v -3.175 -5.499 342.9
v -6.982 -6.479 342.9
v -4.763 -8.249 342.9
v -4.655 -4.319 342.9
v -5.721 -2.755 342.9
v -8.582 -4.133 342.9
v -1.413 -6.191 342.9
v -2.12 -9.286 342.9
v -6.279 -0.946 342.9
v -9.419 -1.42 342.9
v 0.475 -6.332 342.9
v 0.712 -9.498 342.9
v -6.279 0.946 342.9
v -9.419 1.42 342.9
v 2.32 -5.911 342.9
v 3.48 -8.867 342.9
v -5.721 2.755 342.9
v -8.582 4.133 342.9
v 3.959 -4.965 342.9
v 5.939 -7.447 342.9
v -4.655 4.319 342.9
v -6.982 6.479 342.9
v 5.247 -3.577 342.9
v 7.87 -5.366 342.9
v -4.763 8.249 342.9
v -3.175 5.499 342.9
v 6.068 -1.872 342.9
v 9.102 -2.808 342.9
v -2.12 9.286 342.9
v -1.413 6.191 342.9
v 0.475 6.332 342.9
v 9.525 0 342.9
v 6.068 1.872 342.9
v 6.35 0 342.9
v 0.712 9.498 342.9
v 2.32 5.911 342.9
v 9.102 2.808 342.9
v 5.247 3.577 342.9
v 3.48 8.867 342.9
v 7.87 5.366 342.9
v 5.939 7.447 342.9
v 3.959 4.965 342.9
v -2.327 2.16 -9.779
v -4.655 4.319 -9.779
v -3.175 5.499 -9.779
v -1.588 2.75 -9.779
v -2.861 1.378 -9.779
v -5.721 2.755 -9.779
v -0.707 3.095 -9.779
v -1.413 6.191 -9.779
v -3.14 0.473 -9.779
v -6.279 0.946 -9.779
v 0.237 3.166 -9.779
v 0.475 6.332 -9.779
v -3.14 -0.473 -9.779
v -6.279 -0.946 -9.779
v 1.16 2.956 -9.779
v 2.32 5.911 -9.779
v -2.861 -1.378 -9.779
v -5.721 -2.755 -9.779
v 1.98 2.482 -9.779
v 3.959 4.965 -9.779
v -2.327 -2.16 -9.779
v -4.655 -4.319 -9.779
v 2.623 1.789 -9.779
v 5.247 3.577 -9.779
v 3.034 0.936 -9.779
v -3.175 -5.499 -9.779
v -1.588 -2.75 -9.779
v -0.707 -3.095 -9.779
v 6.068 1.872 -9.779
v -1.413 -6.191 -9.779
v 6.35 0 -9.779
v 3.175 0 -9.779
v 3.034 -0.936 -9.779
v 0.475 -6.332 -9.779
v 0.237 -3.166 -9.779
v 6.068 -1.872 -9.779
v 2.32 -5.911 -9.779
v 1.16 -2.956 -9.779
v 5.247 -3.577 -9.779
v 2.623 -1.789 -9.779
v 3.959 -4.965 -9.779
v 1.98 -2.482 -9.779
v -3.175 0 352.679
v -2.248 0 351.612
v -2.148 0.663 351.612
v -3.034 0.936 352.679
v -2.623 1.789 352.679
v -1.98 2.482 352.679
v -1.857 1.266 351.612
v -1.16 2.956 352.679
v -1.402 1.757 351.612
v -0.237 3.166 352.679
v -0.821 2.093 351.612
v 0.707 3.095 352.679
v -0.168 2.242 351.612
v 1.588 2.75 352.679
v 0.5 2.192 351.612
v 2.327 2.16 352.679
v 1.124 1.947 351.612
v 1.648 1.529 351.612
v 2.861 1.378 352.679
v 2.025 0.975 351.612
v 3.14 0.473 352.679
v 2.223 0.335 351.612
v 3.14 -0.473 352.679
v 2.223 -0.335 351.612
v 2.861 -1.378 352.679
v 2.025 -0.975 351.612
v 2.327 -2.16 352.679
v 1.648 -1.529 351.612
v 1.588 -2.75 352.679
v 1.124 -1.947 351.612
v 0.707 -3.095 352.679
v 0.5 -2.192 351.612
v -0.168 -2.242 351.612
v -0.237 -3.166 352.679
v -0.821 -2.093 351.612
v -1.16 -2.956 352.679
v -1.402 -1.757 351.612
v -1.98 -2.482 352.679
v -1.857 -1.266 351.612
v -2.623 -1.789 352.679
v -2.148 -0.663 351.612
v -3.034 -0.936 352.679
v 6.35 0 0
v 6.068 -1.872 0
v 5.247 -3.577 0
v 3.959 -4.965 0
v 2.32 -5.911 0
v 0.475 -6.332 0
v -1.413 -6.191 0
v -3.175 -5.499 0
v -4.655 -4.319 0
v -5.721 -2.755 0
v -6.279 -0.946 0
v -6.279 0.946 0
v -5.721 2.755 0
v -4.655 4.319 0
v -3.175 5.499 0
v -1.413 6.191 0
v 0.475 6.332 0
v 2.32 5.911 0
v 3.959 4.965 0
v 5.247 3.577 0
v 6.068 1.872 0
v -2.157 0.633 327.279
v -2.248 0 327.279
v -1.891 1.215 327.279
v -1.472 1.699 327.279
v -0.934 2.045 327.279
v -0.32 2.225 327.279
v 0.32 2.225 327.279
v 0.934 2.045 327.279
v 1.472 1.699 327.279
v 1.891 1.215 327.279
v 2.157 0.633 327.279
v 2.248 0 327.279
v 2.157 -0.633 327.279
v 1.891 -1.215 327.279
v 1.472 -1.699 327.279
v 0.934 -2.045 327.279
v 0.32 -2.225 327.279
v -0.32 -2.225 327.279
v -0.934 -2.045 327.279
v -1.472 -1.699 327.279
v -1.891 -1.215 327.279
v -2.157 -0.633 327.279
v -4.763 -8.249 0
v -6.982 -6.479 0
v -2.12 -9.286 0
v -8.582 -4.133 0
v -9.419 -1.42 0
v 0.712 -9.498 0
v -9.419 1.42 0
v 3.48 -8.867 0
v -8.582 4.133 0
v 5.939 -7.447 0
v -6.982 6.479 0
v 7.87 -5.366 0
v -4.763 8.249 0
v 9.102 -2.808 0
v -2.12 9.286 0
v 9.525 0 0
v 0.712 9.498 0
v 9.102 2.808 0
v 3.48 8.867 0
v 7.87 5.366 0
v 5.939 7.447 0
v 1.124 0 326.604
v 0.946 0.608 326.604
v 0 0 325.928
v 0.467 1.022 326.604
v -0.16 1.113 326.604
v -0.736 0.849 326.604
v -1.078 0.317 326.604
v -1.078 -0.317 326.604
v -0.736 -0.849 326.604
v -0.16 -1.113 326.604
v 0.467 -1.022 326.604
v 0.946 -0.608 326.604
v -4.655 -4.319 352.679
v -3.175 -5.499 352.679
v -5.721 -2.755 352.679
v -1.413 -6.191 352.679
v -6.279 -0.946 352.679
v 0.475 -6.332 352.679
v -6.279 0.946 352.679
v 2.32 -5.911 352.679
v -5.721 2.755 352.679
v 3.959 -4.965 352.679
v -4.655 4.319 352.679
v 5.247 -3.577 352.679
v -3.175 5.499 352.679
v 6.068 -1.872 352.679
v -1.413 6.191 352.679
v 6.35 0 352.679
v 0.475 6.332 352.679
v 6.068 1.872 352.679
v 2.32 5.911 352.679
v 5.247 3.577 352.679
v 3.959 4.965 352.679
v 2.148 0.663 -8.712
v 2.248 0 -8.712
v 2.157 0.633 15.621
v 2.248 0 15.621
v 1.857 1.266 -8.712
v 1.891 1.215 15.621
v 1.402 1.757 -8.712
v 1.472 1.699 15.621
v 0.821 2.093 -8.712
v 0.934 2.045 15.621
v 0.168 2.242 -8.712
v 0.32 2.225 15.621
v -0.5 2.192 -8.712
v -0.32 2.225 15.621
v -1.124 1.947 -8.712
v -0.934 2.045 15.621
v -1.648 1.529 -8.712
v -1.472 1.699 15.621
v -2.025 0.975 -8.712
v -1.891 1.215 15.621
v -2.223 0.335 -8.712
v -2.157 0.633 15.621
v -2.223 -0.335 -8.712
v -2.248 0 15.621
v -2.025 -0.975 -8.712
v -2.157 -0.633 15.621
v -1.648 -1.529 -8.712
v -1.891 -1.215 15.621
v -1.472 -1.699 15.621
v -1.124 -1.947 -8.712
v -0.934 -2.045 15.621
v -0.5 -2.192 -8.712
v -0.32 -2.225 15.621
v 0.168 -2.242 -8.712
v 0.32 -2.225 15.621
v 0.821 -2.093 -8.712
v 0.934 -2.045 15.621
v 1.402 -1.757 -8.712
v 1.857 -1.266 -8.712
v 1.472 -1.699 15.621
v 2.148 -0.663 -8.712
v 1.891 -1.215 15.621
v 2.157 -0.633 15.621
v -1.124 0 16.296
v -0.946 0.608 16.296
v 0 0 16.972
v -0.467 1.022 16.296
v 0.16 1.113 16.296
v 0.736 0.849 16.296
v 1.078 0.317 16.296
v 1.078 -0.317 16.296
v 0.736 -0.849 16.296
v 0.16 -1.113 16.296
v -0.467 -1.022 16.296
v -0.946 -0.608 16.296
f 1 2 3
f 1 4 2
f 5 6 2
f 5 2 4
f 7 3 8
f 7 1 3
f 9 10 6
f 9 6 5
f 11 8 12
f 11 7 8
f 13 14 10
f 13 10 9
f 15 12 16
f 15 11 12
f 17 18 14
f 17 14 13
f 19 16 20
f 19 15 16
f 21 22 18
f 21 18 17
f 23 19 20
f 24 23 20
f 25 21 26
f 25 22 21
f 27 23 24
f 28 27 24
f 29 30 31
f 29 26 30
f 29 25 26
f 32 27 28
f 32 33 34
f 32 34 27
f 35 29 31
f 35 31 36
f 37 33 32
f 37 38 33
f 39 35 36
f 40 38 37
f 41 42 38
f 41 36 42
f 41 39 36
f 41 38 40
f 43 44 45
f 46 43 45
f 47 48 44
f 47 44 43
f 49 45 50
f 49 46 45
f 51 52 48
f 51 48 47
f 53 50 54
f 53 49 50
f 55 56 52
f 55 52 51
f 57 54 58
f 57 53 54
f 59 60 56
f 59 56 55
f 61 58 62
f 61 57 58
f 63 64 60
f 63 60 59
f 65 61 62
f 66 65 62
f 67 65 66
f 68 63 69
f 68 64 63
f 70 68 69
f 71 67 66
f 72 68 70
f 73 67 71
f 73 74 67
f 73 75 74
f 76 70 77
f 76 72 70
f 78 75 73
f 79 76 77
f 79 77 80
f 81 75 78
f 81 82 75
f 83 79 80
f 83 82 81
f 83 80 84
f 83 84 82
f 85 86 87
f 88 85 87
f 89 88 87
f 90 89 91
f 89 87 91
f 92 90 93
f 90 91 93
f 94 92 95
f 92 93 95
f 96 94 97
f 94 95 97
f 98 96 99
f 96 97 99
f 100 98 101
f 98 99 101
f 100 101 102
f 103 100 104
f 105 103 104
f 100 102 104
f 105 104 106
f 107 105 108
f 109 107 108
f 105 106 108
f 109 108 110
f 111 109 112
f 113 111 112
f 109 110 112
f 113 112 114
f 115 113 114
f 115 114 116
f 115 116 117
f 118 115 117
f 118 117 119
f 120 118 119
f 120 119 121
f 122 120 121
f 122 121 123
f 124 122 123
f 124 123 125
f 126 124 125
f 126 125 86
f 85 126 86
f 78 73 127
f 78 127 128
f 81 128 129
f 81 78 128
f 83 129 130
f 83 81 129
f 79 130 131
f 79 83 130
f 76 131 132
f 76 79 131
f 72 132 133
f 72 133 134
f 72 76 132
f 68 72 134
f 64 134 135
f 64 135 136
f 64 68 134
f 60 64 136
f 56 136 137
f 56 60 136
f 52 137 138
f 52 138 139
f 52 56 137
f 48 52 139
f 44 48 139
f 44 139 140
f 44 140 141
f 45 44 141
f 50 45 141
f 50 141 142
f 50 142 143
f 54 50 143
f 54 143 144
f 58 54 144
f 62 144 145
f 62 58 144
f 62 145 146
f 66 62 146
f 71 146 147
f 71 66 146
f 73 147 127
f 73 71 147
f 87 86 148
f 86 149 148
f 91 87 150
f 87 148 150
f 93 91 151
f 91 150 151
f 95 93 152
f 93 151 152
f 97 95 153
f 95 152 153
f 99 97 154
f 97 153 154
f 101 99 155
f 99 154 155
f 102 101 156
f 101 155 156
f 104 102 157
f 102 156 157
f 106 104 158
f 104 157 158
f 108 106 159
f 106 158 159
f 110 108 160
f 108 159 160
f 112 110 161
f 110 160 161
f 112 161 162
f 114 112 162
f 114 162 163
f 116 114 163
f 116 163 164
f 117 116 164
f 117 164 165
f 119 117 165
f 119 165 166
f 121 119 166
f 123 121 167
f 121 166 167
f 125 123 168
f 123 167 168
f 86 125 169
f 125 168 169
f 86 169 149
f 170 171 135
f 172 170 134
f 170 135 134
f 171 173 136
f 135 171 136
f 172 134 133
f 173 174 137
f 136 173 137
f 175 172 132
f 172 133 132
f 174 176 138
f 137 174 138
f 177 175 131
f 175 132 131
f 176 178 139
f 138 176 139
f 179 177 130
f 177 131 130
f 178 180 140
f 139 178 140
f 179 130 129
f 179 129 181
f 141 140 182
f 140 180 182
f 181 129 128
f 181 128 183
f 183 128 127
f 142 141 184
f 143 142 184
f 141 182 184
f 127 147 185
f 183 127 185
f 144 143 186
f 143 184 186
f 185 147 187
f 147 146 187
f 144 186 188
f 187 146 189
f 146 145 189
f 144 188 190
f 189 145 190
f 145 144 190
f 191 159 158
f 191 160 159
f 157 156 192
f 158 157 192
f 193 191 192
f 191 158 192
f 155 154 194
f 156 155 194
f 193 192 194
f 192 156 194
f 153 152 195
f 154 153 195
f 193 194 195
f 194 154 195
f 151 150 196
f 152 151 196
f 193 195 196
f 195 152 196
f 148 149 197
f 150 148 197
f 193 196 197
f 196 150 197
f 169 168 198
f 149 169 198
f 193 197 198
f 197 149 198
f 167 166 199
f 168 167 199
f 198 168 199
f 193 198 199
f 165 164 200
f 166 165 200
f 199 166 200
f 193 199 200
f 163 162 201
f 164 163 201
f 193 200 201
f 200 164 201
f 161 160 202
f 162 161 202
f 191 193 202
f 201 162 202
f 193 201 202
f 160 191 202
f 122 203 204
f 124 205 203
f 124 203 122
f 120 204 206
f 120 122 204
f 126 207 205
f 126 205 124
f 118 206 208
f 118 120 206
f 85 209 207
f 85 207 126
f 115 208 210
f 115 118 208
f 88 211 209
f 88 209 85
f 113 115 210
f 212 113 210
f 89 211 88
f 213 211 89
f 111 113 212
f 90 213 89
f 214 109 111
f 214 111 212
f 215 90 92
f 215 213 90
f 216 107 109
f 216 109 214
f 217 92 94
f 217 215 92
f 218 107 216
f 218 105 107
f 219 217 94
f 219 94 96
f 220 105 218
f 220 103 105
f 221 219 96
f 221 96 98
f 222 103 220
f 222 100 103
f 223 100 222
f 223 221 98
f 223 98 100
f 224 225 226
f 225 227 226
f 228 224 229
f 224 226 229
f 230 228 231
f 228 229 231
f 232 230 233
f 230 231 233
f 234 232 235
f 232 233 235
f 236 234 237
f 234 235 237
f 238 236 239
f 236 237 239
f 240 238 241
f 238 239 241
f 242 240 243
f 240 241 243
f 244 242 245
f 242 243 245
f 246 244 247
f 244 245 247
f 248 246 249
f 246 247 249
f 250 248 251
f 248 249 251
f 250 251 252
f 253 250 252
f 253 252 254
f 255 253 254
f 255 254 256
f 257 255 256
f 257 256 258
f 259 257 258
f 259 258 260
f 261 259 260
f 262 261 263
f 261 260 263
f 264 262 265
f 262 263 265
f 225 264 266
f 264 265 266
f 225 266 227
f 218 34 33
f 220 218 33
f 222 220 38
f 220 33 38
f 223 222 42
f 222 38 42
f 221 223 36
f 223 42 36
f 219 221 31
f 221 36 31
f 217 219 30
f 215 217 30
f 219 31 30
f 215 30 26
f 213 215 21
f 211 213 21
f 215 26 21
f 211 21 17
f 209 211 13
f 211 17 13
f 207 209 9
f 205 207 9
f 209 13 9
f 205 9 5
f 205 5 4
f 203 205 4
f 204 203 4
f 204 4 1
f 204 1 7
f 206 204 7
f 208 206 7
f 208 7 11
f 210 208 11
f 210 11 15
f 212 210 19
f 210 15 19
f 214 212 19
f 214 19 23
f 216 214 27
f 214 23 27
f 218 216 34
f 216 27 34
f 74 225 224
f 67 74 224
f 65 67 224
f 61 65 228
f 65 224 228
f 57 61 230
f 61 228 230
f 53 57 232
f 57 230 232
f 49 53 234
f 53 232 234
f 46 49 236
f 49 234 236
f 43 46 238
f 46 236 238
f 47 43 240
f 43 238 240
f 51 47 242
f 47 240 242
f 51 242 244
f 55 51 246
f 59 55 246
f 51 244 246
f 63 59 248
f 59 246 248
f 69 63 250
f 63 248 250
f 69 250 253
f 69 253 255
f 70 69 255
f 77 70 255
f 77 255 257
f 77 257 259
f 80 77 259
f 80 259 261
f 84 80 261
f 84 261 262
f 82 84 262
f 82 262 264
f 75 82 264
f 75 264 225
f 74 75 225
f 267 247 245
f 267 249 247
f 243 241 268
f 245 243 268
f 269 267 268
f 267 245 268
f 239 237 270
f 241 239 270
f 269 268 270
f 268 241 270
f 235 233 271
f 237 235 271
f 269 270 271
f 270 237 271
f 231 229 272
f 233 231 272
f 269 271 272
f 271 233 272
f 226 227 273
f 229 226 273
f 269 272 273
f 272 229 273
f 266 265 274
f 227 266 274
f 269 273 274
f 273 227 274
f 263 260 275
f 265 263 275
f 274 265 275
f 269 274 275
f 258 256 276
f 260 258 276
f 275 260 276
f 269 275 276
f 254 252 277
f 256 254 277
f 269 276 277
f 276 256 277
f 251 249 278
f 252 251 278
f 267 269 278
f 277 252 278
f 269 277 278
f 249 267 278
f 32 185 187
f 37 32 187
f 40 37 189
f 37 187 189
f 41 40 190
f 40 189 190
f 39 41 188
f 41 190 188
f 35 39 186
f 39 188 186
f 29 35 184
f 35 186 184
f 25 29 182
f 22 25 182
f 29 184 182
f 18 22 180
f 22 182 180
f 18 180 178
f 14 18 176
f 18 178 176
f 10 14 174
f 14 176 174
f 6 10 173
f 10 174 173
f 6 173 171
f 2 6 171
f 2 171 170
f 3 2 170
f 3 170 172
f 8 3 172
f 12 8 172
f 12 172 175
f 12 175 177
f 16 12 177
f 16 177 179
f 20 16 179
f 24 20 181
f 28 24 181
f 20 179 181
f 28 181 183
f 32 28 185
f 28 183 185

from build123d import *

# Parameters (mm, degrees)
SKETCH1_R                        = 9.525
BOSS_EXTRUDE1_DEPTH              = 342.9
SKETCH2_R                        = 6.35
BOSS_EXTRUDE2_DEPTH              = 9.779
F_12_24_TAPPED_HOLE1_D           = 4.4958
F_12_24_TAPPED_HOLE1_DEPTH       = 25.4
F_12_24_TAPPED_HOLE1_CSINK_D     = 6.35
F_12_24_TAPPED_HOLE1_CSINK_ANGLE = 82
F_12_24_TAPPED_HOLE1_TIP         = 1.350674586
BOSS_EXTRUDE3_START              = 9.779
SKETCH5_R                        = 6.35
BOSS_EXTRUDE3_DEPTH              = 9.779
F_12_24_TAPPED_HOLE2_D           = 4.4958
F_12_24_TAPPED_HOLE2_DEPTH       = 25.4
F_12_24_TAPPED_HOLE2_CSINK_D     = 6.35
F_12_24_TAPPED_HOLE2_CSINK_ANGLE = 82
F_12_24_TAPPED_HOLE2_TIP         = 1.350674586


with BuildPart() as part:
    # Sketch1 → Boss-Extrude1 (new body)
    with BuildSketch(Plane.XY):
        Circle(SKETCH1_R)
    extrude(amount=BOSS_EXTRUDE1_DEPTH)

    # Sketch2 → Boss-Extrude2 (add)
    with BuildSketch(Plane.XY.offset(342.9)):
        Circle(SKETCH2_R)
    extrude(amount=BOSS_EXTRUDE2_DEPTH)

    # #12-24 Tapped Hole1
    with Locations(Plane.XY.offset(352.679)):
        with Locations((0, 0)):
            CounterSinkHole(F_12_24_TAPPED_HOLE1_D / 2, F_12_24_TAPPED_HOLE1_CSINK_D / 2, depth=F_12_24_TAPPED_HOLE1_DEPTH, counter_sink_angle=F_12_24_TAPPED_HOLE1_CSINK_ANGLE)
            with Locations((0, 0, -(F_12_24_TAPPED_HOLE1_DEPTH + F_12_24_TAPPED_HOLE1_TIP / 2))):  # 118° drill point
                Cone(0, F_12_24_TAPPED_HOLE1_D / 2, F_12_24_TAPPED_HOLE1_TIP, mode=Mode.SUBTRACT)

    # Sketch5 → Boss-Extrude3 (add)
    with BuildSketch(Plane(origin=(0, 0, 0), x_dir=(-1, 0, 0), z_dir=(0, 0, -1)).offset(BOSS_EXTRUDE3_START)):
        with Locations(Location((0, 0, 0), (0, 0, 180))):
            Circle(SKETCH5_R)
    extrude(amount=-BOSS_EXTRUDE3_DEPTH)

    # #12-24 Tapped Hole2
    with Locations(Plane(origin=(0, 0, -9.779), x_dir=(-1, 0, 0), z_dir=(0, 0, -1))):
        with Locations((0, 0)):
            CounterSinkHole(F_12_24_TAPPED_HOLE2_D / 2, F_12_24_TAPPED_HOLE2_CSINK_D / 2, depth=F_12_24_TAPPED_HOLE2_DEPTH, counter_sink_angle=F_12_24_TAPPED_HOLE2_CSINK_ANGLE)
            with Locations((0, 0, -(F_12_24_TAPPED_HOLE2_DEPTH + F_12_24_TAPPED_HOLE2_TIP / 2))):  # 118° drill point
                Cone(0, F_12_24_TAPPED_HOLE2_D / 2, F_12_24_TAPPED_HOLE2_TIP, mode=Mode.SUBTRACT)


solid = part.part
